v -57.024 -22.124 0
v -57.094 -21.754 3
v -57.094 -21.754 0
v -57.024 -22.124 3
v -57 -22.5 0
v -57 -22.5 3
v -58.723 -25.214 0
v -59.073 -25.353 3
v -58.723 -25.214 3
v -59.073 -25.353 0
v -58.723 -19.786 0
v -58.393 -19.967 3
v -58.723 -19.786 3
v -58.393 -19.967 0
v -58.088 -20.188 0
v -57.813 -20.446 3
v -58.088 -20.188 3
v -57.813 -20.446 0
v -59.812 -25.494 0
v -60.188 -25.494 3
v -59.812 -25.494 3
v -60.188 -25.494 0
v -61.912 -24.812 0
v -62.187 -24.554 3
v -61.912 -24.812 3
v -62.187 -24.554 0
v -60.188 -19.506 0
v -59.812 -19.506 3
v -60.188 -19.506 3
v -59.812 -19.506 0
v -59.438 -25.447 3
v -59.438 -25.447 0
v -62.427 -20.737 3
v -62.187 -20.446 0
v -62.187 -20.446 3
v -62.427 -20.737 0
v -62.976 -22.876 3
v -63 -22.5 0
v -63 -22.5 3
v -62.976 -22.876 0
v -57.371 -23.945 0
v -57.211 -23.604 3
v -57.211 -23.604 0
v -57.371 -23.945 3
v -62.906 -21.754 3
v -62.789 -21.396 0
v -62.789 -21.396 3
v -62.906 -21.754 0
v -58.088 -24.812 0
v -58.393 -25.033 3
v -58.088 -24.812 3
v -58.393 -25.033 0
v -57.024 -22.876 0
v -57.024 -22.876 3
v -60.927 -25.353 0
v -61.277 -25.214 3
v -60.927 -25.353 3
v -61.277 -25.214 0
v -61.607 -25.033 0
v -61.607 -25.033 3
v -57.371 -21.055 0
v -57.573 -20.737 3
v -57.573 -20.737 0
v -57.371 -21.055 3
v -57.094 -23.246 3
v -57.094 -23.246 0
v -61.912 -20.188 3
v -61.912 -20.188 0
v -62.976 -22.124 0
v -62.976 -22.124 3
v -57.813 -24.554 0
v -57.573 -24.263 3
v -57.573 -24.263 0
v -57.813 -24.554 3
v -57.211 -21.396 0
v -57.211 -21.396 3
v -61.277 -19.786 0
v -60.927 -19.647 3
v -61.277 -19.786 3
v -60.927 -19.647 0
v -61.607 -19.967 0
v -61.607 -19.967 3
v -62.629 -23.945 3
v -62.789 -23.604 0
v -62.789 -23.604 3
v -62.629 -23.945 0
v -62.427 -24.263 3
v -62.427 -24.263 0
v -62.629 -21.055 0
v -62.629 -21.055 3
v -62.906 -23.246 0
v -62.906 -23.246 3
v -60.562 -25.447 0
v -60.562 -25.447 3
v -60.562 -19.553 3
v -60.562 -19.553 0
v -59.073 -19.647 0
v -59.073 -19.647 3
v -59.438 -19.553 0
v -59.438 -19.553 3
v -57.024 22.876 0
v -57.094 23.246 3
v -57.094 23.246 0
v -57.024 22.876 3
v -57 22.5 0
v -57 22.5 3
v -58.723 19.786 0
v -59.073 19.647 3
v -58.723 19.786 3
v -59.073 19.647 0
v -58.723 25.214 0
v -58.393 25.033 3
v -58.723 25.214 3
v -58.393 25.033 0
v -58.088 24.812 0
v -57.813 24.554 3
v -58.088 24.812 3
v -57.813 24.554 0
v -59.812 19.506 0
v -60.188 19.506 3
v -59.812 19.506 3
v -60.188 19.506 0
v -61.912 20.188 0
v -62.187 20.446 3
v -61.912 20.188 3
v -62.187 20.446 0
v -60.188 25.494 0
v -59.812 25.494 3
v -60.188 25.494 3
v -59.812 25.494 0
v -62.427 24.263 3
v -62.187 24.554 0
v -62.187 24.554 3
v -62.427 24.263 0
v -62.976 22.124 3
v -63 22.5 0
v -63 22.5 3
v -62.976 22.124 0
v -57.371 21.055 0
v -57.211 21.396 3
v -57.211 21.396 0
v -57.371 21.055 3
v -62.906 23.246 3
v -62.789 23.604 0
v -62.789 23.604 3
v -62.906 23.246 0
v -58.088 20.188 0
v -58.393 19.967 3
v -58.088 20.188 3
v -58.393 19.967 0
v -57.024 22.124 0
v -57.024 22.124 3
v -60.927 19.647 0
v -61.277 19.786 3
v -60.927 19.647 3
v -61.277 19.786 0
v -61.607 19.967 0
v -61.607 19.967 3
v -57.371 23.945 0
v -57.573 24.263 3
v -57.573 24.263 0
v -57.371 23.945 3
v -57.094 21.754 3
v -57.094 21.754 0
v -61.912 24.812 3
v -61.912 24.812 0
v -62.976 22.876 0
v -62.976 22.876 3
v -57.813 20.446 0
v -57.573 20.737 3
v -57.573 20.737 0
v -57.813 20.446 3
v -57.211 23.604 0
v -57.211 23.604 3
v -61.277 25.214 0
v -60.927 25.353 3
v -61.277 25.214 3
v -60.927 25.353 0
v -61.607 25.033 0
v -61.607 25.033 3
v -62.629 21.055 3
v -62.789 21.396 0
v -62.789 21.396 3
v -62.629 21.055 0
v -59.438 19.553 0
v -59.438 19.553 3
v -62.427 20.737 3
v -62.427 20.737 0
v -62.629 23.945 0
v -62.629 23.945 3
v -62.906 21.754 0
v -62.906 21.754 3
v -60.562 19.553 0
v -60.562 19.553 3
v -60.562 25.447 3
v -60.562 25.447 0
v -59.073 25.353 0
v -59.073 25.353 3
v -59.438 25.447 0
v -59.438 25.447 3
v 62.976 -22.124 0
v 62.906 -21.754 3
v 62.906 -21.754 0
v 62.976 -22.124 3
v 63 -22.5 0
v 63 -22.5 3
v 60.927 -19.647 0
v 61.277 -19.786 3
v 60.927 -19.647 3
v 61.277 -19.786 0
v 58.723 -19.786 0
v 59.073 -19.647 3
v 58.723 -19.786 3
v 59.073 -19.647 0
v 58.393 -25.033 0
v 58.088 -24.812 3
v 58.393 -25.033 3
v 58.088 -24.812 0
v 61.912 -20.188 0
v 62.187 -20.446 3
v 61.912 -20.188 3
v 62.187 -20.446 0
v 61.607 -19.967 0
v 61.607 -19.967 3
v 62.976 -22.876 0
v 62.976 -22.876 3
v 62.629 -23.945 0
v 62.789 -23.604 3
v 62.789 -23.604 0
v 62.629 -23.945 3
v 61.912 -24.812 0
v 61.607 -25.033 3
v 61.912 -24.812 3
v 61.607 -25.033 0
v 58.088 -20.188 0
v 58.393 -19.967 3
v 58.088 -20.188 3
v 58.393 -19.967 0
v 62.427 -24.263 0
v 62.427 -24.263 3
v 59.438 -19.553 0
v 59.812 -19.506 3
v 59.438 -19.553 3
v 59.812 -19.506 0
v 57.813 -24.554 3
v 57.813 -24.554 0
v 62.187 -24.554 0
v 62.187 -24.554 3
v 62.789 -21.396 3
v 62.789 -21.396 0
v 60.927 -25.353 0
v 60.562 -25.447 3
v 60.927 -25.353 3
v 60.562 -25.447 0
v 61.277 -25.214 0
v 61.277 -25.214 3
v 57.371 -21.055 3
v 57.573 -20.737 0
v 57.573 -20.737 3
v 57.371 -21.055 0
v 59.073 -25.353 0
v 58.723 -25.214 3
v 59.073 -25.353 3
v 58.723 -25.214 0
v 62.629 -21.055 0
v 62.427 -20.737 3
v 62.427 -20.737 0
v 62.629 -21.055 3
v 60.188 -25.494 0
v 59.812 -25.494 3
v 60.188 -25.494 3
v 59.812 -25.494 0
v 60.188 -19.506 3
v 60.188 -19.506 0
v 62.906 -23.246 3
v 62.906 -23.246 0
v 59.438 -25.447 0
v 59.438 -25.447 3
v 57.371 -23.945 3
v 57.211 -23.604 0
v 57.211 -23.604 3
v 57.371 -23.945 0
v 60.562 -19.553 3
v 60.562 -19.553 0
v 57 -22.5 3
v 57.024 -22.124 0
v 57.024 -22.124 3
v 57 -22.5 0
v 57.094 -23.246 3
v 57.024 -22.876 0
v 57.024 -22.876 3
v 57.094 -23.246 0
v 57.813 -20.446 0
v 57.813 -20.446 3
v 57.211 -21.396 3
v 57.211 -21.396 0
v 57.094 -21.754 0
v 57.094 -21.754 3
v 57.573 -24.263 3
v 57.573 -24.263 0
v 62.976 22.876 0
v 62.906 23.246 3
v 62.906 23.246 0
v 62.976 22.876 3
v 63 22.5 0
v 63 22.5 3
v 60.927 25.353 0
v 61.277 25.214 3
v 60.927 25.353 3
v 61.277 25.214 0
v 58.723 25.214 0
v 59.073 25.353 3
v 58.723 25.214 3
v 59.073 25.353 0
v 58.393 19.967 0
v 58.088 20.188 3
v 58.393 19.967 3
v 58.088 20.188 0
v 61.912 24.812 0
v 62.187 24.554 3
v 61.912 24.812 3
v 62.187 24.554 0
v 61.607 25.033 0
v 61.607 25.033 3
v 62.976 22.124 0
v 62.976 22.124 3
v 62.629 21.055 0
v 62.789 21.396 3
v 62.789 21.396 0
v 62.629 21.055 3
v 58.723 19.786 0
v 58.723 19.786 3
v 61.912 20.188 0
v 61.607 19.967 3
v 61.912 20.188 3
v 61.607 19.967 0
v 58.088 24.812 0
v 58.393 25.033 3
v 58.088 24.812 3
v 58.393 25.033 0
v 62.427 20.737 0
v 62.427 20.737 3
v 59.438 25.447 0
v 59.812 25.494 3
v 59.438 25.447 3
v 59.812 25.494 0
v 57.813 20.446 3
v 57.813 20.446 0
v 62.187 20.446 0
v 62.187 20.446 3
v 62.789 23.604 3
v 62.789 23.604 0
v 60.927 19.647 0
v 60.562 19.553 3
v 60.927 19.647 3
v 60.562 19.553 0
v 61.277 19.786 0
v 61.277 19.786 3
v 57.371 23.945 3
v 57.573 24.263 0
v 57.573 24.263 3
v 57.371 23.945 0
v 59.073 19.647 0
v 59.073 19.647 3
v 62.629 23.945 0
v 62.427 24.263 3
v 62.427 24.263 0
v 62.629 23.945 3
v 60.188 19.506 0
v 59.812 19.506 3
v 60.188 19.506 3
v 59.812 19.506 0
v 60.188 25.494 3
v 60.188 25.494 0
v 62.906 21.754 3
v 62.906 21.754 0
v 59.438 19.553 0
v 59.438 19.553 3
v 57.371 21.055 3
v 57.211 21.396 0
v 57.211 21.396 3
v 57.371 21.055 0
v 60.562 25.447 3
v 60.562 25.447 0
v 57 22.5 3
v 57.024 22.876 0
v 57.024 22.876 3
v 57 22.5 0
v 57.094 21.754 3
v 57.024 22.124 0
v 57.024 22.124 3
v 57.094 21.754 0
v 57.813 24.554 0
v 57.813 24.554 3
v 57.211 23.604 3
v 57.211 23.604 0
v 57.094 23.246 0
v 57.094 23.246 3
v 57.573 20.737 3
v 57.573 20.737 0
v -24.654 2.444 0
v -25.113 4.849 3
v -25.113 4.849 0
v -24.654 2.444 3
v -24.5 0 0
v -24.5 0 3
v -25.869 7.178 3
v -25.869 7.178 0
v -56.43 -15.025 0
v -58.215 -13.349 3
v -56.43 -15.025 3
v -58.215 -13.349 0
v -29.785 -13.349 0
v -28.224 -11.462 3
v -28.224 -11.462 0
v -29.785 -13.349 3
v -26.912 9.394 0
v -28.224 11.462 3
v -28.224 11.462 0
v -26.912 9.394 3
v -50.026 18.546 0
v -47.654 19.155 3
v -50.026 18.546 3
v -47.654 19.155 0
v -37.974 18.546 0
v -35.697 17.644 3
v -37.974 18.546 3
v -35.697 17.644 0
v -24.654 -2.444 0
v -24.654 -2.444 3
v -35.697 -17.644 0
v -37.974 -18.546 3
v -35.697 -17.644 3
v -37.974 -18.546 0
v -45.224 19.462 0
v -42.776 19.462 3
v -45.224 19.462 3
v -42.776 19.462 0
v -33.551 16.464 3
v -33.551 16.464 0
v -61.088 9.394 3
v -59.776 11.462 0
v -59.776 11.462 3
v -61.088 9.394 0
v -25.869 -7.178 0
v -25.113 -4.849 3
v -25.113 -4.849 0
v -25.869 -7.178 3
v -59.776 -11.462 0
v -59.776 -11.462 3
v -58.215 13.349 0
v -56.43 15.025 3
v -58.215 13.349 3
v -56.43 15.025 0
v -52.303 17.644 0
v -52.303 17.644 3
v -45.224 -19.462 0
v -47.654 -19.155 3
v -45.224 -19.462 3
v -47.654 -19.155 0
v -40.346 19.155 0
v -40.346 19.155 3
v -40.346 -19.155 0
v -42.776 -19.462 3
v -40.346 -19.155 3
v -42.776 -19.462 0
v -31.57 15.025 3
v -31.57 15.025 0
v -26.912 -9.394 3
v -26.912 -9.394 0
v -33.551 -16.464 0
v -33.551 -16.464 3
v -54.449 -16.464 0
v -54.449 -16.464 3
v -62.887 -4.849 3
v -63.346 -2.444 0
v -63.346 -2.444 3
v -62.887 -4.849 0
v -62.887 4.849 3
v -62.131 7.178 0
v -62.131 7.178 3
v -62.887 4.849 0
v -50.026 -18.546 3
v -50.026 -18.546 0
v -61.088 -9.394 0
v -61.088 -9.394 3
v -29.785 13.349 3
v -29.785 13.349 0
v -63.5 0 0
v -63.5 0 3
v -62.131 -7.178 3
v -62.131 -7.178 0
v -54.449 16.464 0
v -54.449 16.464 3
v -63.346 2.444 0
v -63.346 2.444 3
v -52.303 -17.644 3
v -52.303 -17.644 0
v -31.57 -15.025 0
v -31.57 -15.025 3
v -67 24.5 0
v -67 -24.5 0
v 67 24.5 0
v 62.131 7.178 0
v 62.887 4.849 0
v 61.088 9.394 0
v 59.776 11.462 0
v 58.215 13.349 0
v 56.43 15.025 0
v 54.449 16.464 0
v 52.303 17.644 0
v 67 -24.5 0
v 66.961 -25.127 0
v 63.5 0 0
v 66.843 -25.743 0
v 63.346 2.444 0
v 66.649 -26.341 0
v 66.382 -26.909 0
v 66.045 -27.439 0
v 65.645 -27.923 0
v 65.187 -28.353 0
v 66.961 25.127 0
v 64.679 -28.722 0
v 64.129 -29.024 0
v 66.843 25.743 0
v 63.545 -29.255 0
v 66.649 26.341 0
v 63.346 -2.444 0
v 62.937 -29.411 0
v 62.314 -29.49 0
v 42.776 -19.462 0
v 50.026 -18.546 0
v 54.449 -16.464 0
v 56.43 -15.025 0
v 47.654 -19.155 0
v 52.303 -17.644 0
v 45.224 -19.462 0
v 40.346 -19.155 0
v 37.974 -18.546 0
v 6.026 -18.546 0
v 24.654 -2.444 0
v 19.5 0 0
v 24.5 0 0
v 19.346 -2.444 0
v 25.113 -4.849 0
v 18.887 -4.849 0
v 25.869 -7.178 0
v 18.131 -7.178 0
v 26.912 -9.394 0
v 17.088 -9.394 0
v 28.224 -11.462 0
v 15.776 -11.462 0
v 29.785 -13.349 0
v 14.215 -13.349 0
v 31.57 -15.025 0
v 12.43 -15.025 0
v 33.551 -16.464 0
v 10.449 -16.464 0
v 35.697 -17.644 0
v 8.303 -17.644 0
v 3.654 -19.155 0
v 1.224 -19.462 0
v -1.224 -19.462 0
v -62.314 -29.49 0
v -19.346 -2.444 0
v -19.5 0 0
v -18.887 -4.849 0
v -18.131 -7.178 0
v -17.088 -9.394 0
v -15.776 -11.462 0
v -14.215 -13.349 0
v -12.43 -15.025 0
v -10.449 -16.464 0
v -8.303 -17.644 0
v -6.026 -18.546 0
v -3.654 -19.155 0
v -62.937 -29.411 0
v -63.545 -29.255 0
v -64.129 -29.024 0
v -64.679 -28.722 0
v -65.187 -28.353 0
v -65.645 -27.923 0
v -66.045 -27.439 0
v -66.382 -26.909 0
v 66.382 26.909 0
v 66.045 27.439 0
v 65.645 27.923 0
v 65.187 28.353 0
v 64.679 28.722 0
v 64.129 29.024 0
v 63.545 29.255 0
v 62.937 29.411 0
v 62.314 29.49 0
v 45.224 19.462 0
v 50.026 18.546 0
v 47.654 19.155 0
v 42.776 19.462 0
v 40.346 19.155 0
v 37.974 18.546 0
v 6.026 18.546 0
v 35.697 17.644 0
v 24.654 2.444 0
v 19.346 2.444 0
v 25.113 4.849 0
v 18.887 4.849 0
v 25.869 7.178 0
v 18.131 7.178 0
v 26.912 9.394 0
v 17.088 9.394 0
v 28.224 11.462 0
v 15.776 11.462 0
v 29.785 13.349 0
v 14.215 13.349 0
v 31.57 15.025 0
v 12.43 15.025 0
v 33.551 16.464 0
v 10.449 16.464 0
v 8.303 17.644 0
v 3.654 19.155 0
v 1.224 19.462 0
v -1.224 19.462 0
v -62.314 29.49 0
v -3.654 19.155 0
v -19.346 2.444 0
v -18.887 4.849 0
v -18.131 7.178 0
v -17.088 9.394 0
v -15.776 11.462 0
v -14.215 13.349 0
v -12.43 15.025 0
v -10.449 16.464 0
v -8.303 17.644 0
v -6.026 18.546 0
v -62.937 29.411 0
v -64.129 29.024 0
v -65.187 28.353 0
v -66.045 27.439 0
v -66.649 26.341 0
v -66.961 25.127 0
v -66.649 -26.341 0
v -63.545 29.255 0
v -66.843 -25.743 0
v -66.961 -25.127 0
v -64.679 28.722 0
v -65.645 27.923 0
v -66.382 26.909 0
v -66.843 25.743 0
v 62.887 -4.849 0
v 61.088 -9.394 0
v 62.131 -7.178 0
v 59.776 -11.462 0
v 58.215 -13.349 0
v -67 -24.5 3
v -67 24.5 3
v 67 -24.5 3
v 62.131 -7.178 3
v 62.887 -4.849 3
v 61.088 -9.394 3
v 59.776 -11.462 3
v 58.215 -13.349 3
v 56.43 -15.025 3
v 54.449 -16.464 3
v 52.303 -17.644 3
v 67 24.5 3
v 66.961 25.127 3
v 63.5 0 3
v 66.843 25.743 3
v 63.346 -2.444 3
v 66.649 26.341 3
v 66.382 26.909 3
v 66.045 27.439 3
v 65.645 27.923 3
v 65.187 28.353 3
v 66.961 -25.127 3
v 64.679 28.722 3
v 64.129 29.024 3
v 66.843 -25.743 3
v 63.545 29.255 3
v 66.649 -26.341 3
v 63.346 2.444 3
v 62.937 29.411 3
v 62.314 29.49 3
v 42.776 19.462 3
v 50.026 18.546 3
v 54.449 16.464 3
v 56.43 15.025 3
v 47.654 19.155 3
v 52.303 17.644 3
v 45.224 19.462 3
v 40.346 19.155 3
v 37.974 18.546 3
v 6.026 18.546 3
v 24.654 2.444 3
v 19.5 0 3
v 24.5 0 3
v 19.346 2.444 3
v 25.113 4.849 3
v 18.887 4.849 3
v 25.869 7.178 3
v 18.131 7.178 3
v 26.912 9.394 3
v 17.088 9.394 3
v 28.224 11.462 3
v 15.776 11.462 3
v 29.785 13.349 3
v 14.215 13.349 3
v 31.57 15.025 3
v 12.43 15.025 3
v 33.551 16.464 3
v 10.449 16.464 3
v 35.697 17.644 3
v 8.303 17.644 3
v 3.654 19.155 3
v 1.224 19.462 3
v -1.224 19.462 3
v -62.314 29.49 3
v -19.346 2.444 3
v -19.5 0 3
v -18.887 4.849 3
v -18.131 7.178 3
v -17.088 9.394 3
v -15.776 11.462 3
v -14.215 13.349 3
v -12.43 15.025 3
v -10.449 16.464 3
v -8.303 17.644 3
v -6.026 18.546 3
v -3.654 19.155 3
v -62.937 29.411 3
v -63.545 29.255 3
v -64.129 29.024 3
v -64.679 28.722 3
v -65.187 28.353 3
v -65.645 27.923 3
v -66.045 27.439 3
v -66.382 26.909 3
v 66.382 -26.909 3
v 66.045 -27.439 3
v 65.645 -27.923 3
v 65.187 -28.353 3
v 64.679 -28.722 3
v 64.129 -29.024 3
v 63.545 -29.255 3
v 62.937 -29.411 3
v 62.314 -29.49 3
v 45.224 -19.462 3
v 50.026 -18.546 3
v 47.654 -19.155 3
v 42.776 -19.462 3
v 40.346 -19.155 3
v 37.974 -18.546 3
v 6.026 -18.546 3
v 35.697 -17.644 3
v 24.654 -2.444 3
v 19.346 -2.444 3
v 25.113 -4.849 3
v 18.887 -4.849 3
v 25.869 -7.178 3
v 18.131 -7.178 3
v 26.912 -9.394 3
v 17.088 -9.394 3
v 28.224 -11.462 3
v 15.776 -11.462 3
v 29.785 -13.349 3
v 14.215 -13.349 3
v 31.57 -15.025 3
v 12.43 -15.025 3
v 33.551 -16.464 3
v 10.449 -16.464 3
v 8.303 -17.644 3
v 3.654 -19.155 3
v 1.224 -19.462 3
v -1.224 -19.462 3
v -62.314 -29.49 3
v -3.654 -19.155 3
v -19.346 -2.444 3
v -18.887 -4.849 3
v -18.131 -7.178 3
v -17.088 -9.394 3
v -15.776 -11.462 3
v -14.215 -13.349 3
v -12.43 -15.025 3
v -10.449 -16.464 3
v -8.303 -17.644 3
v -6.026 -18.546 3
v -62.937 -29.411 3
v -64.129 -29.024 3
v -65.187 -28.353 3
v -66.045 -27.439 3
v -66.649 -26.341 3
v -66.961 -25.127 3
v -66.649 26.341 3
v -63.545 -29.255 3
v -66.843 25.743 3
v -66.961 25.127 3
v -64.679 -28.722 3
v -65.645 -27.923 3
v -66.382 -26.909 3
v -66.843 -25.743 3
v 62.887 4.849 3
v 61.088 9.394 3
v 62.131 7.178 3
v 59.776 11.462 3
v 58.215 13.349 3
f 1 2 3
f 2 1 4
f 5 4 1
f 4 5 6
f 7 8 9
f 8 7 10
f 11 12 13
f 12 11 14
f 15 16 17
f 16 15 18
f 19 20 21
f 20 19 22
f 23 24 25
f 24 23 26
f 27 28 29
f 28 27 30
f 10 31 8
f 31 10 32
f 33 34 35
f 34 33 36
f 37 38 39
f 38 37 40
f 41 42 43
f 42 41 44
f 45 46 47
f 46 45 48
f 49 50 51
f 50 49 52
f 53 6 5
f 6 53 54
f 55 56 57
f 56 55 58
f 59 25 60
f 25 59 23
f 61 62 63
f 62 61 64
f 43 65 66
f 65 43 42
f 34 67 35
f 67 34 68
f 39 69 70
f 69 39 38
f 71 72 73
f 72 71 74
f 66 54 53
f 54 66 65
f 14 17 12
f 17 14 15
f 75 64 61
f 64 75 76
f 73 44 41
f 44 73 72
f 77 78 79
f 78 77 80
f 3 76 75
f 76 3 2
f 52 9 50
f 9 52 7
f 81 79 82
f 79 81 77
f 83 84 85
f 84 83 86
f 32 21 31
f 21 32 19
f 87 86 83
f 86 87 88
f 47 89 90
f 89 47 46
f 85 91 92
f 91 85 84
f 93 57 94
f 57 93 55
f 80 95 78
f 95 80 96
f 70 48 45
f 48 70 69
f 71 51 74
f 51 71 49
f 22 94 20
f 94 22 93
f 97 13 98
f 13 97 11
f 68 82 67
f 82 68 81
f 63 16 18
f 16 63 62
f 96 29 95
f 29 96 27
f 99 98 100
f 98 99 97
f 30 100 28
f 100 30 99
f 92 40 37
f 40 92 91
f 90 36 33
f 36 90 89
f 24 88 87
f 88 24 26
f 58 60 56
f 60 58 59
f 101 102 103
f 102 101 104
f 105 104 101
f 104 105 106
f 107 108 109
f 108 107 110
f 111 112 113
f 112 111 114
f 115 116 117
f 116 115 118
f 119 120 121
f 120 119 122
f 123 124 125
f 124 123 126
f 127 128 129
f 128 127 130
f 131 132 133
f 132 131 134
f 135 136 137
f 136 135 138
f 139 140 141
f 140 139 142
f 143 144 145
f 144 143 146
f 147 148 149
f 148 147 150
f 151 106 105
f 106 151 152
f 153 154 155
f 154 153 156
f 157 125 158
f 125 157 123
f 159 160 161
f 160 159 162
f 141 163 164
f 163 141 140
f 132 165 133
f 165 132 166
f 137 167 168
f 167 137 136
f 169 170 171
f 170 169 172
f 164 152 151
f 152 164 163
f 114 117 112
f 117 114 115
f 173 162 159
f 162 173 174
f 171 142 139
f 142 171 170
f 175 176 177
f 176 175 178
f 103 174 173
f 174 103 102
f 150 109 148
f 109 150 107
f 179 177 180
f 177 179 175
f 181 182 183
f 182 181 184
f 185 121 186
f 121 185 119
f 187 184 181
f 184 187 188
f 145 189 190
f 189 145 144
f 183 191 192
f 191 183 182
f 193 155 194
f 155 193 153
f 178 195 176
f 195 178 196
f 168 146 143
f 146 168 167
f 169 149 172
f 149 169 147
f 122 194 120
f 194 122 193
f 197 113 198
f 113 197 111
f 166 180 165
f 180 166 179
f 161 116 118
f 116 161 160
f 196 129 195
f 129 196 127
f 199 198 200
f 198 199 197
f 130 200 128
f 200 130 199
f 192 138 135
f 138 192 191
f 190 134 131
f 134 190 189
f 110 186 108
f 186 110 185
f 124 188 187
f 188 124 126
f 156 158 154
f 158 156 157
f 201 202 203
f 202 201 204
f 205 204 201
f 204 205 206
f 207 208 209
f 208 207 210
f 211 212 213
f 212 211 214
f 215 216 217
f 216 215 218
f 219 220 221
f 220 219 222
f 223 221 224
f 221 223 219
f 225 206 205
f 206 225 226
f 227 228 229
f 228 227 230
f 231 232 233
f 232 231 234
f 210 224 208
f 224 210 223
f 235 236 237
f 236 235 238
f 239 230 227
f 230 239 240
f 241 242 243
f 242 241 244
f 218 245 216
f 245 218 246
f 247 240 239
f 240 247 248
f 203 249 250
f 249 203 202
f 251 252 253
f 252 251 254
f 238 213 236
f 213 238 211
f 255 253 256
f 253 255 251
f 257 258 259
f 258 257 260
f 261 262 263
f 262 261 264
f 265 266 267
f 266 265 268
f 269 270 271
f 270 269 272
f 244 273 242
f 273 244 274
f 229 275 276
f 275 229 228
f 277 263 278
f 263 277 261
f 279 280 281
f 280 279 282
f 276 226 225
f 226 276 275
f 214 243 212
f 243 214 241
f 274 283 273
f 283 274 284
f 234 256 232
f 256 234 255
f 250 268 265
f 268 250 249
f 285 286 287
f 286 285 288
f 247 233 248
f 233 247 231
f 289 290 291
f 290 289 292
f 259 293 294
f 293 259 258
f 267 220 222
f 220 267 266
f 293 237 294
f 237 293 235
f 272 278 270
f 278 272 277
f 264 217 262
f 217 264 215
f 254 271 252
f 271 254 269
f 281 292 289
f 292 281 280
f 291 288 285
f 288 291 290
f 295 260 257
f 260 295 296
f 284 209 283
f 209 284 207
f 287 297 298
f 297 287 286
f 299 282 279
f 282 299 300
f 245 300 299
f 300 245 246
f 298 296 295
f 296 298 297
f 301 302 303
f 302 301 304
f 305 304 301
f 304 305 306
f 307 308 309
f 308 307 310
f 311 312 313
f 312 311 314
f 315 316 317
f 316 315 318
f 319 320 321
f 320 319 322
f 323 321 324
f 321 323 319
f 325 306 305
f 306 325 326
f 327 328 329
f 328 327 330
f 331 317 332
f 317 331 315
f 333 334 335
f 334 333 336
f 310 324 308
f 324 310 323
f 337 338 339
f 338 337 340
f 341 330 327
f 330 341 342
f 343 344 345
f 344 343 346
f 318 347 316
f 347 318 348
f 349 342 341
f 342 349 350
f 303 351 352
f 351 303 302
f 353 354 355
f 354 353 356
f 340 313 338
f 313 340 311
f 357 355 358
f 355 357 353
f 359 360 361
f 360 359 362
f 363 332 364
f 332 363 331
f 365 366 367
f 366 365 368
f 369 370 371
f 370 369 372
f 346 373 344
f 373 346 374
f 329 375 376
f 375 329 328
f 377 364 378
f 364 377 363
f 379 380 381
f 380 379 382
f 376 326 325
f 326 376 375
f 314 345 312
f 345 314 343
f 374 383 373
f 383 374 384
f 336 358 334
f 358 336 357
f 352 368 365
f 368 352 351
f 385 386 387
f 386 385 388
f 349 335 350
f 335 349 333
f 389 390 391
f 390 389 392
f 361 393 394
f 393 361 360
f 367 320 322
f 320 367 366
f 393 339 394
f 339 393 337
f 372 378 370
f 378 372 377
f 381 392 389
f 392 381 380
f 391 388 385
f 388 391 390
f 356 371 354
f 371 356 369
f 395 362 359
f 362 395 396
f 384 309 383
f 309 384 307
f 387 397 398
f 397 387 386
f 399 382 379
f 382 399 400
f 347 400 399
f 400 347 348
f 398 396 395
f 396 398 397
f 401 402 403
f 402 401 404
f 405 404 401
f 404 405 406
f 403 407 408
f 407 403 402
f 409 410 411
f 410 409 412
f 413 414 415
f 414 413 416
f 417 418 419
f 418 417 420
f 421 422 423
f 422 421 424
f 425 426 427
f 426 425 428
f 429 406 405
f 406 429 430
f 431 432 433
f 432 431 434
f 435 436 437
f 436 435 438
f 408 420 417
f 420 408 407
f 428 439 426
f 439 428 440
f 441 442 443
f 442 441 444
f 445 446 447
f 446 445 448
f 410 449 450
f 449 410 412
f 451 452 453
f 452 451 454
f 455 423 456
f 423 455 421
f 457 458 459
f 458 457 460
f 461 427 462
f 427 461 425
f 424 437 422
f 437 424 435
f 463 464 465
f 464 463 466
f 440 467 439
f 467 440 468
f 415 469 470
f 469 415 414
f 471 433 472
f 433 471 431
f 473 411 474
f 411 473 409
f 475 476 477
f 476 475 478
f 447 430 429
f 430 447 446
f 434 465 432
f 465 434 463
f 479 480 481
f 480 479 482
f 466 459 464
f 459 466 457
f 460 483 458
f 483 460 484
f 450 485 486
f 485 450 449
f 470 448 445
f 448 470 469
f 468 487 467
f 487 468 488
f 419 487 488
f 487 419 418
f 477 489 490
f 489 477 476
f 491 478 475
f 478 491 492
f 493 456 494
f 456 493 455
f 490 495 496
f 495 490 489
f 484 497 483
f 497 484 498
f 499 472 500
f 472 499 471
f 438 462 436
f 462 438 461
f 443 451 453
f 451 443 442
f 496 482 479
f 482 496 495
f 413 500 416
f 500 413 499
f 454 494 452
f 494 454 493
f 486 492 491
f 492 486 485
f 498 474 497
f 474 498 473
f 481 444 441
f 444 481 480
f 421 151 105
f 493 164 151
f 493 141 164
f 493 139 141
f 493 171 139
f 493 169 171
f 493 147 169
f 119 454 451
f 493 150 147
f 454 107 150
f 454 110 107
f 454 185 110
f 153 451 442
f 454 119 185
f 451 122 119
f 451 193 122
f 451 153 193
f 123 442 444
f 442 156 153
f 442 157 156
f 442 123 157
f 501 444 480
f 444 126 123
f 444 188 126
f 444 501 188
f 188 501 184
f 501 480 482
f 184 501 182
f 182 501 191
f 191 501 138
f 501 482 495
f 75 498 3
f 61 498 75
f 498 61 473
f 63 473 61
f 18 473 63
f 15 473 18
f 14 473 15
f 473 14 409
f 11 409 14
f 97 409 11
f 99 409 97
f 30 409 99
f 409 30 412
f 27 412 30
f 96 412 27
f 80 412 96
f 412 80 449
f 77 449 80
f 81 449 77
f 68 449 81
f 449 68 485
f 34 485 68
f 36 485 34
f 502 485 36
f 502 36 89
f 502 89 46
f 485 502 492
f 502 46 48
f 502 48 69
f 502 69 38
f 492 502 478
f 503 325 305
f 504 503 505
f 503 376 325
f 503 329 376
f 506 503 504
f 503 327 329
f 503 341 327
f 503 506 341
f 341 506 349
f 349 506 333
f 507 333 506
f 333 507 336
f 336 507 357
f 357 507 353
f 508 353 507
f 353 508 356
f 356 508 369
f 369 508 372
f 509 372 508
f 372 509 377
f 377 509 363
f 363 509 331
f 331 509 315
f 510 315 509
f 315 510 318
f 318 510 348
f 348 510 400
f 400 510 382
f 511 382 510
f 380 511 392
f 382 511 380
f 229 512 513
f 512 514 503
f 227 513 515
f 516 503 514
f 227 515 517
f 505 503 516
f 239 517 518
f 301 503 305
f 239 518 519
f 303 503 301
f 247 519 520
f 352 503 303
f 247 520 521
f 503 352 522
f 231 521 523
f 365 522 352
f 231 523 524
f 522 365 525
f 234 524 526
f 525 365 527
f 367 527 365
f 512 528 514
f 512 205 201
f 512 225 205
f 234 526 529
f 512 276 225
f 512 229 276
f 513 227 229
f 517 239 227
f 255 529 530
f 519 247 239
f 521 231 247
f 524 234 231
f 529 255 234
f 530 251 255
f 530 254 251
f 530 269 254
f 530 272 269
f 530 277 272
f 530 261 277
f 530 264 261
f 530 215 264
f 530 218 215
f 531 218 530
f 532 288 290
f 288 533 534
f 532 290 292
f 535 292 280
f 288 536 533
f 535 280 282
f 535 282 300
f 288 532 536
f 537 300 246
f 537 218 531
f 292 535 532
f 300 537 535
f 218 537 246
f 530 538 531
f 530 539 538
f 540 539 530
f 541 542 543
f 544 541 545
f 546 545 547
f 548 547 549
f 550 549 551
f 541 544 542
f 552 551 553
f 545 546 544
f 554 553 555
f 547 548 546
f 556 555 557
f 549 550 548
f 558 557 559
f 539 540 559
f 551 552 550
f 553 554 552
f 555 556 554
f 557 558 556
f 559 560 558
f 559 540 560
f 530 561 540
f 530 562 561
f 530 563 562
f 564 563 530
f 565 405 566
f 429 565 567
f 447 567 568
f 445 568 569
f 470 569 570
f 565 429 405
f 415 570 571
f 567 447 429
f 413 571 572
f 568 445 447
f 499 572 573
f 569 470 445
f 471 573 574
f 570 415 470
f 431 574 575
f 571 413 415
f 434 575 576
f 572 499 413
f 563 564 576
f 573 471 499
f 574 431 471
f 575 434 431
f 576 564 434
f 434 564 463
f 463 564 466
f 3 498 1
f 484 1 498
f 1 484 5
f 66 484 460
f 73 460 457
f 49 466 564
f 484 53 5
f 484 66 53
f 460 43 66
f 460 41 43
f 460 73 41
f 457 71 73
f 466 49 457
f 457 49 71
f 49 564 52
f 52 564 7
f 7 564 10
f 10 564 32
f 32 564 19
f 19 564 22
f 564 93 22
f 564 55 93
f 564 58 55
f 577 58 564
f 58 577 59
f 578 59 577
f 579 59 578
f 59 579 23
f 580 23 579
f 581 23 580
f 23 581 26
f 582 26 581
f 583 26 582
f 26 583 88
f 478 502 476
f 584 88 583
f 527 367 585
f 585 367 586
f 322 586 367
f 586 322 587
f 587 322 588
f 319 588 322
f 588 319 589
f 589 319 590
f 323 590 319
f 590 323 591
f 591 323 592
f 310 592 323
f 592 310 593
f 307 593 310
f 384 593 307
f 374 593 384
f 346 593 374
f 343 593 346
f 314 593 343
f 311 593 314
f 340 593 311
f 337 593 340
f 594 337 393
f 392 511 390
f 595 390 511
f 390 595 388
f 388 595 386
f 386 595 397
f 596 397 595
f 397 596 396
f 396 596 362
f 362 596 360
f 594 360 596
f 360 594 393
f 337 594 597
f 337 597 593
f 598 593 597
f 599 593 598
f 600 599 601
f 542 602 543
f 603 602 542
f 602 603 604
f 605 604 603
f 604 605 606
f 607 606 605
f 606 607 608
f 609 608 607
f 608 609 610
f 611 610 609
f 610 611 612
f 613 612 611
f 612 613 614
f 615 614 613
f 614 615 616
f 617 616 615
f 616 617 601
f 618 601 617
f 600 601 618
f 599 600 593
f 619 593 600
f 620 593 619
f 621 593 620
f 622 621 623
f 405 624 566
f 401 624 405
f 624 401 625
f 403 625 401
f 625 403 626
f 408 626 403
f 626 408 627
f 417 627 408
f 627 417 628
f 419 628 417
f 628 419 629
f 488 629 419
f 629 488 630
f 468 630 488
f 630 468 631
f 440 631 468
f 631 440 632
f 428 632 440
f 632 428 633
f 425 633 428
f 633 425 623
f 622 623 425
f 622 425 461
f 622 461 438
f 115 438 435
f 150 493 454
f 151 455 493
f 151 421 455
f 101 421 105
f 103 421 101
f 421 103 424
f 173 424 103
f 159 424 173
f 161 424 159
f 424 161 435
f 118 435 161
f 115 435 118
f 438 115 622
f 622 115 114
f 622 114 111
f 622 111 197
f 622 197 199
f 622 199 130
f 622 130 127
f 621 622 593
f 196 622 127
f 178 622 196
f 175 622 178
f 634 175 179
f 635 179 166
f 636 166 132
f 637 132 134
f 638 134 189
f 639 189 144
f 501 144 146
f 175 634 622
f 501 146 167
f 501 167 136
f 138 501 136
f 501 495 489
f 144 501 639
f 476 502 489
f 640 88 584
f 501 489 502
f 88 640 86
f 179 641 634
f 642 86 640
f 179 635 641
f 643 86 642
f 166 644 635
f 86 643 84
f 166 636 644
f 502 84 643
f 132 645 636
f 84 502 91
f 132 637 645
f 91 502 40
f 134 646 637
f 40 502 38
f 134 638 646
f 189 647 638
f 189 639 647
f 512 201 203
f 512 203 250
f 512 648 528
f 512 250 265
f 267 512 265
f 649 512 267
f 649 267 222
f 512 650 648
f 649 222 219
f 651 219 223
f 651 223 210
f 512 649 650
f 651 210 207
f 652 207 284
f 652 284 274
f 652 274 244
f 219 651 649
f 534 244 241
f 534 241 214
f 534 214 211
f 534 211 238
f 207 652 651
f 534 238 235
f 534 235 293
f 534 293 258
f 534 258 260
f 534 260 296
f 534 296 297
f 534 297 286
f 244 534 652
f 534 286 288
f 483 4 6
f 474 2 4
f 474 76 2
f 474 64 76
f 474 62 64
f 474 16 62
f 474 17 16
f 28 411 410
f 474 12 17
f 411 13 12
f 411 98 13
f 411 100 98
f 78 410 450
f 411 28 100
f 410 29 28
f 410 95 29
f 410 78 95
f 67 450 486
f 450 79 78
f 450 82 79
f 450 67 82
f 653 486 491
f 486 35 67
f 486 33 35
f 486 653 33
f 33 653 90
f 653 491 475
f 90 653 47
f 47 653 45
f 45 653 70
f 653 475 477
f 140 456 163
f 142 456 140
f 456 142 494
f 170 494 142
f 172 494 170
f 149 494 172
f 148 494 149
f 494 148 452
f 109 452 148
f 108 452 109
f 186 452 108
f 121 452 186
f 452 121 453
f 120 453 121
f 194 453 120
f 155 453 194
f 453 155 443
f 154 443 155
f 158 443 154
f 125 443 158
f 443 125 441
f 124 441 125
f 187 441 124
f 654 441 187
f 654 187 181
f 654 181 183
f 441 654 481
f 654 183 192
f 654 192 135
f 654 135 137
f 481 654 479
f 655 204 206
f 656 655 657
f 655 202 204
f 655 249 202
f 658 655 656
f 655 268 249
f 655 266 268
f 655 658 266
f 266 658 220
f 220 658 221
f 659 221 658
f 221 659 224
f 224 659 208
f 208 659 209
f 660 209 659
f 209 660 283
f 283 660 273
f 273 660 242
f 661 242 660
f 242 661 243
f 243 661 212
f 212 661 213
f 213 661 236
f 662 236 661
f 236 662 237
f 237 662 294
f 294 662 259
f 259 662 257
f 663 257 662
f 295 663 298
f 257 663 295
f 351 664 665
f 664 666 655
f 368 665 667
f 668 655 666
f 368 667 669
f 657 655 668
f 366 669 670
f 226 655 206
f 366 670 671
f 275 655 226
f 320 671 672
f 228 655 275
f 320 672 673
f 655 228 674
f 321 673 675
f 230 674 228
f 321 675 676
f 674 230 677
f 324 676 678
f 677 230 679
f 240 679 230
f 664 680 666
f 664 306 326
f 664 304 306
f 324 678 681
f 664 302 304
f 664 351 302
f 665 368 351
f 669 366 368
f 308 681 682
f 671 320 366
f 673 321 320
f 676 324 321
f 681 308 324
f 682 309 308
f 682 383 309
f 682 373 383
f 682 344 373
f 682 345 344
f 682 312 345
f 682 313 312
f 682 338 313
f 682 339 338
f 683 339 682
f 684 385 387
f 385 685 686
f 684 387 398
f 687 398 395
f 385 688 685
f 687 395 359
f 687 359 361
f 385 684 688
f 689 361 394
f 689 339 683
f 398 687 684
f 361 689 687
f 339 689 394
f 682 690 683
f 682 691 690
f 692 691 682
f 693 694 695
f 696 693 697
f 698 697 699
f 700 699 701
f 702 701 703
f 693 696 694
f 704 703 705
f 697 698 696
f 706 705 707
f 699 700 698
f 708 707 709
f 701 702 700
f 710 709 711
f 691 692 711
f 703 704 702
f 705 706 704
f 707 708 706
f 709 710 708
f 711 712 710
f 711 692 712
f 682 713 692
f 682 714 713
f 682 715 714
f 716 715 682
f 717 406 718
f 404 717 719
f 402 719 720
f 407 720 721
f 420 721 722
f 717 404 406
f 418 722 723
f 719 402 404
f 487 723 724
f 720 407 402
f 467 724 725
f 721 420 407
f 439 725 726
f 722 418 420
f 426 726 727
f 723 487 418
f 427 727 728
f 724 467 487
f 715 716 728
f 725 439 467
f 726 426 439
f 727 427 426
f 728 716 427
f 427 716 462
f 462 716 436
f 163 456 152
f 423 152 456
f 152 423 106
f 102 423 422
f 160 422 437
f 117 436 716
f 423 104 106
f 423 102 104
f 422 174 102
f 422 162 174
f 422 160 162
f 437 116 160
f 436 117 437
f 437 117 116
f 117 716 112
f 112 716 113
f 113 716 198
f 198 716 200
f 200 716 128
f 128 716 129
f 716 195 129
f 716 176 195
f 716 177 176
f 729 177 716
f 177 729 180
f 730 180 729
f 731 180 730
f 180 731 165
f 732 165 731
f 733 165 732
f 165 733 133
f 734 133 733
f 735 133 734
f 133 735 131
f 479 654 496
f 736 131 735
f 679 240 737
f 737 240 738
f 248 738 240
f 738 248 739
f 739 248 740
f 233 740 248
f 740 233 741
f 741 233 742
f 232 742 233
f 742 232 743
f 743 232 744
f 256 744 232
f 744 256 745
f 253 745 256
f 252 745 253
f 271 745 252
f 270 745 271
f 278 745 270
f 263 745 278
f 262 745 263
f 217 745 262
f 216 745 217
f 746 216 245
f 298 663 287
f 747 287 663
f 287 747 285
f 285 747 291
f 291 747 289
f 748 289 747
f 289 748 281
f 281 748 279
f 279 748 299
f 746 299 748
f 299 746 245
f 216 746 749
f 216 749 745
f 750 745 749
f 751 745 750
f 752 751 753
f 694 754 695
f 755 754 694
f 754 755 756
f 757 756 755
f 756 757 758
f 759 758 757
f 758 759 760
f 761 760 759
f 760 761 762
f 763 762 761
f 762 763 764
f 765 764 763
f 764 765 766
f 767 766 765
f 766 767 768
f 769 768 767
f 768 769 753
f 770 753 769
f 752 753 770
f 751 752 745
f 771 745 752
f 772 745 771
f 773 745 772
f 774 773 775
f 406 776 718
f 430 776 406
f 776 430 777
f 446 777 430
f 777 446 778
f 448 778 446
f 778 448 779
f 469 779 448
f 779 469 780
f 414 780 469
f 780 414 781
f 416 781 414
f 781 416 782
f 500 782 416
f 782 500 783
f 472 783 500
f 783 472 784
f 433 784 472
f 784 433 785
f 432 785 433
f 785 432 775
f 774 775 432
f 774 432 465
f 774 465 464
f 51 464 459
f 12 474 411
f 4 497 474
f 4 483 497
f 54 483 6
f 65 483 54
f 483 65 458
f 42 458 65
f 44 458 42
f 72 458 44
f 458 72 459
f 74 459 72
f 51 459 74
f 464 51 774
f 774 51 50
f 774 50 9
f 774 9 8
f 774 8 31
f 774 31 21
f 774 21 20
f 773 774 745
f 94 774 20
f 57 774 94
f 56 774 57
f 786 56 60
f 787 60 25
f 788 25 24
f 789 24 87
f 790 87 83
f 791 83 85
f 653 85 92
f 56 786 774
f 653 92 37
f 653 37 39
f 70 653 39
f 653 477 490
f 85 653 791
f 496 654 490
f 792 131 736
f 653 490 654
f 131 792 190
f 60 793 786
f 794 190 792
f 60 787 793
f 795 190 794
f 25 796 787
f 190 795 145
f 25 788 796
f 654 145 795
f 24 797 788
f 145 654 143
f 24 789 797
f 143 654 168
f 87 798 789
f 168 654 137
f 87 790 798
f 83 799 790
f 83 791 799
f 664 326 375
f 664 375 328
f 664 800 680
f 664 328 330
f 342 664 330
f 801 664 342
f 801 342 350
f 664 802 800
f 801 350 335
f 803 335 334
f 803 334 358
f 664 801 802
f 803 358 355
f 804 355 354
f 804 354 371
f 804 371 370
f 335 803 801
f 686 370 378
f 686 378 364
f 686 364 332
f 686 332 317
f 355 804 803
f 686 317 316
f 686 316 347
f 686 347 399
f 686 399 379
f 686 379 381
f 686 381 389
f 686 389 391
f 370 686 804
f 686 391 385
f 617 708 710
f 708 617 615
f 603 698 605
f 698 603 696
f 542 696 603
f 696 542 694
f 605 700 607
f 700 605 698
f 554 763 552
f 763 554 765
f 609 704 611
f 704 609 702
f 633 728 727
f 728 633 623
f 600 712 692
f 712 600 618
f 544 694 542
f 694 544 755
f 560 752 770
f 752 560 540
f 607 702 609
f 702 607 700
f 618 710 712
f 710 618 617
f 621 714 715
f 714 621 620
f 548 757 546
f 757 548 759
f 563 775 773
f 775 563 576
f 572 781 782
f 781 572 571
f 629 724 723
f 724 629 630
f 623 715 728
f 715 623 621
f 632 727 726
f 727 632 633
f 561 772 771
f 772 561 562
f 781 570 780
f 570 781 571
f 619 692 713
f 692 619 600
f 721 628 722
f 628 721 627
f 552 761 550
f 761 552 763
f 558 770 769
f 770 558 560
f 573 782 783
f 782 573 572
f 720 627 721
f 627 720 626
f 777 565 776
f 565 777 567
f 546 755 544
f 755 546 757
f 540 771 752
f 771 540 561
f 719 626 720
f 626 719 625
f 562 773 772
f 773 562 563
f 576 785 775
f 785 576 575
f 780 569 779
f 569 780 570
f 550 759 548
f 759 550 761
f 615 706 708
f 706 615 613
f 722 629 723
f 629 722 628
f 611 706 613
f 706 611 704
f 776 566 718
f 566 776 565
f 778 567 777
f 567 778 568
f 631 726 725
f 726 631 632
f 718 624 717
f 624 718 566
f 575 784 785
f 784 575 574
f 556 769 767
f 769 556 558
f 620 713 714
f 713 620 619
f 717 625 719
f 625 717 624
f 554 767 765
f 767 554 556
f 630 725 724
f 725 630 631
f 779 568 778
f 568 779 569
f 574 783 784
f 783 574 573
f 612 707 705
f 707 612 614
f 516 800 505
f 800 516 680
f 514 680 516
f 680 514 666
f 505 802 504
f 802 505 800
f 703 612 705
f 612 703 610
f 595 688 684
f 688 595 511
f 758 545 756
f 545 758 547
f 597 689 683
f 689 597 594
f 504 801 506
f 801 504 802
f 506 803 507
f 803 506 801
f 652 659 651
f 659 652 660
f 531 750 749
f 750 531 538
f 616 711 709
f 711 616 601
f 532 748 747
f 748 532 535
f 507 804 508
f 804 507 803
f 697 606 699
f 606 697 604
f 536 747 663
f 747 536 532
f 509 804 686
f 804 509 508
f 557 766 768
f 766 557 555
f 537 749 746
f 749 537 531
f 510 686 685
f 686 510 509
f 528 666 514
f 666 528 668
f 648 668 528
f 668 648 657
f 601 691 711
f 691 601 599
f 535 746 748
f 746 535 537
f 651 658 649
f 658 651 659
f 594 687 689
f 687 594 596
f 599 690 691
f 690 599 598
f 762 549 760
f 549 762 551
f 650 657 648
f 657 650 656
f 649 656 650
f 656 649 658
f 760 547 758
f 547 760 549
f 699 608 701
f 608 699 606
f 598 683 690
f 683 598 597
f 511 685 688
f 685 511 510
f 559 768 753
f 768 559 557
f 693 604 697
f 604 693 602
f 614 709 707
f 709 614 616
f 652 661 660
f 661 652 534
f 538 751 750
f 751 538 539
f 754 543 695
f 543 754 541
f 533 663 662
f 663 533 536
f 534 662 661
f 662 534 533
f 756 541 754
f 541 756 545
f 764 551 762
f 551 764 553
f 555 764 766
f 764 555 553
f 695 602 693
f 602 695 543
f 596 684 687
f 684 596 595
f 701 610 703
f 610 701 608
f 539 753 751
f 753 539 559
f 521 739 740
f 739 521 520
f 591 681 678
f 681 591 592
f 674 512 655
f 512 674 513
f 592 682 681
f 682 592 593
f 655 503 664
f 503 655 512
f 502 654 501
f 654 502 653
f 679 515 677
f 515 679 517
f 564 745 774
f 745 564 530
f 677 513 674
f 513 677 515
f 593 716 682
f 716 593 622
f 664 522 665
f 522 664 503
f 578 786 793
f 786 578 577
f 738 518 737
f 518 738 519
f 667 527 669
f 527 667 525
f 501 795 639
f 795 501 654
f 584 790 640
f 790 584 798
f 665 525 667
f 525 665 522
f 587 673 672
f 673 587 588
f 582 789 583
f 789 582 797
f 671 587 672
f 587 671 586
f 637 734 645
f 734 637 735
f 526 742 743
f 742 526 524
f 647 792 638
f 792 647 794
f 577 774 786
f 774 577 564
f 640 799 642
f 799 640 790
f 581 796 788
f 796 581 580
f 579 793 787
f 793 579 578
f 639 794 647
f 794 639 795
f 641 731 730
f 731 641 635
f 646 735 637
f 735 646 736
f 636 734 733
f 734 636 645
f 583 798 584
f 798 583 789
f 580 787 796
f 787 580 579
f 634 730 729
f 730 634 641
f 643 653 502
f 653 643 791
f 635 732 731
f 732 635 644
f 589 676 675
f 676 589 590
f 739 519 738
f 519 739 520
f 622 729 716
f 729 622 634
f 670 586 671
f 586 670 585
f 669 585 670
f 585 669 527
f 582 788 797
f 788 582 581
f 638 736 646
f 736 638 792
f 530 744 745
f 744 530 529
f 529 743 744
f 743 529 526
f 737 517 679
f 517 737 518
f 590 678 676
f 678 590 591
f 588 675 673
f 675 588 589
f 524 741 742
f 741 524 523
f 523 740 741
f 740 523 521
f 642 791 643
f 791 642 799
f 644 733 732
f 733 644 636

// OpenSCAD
$fn = 50;


difference() {
	union() {
		hull() {
			translate(v = [-62.0000000000, 24.5000000000, 0]) {
				cylinder(h = 3, r = 5);
			}
			translate(v = [62.0000000000, 24.5000000000, 0]) {
				cylinder(h = 3, r = 5);
			}
			translate(v = [-62.0000000000, -24.5000000000, 0]) {
				cylinder(h = 3, r = 5);
			}
			translate(v = [62.0000000000, -24.5000000000, 0]) {
				cylinder(h = 3, r = 5);
			}
		}
	}
	union() {
		#translate(v = [-60.0000000000, -22.5000000000, -100.0000000000]) {
			cylinder(h = 200, r = 3.0000000000);
		}
		#translate(v = [-60.0000000000, 22.5000000000, -100.0000000000]) {
			cylinder(h = 200, r = 3.0000000000);
		}
		#translate(v = [60.0000000000, -22.5000000000, -100.0000000000]) {
			cylinder(h = 200, r = 3.0000000000);
		}
		#translate(v = [60.0000000000, 22.5000000000, -100.0000000000]) {
			cylinder(h = 200, r = 3.0000000000);
		}
		#translate(v = [-44.0000000000, 0, 0]) {
			cylinder(h = 3, r = 19.5000000000);
		}
		#cylinder(h = 3, r = 19.5000000000);
		#translate(v = [44.0000000000, 0, 0]) {
			cylinder(h = 3, r = 19.5000000000);
		}
	}
}
